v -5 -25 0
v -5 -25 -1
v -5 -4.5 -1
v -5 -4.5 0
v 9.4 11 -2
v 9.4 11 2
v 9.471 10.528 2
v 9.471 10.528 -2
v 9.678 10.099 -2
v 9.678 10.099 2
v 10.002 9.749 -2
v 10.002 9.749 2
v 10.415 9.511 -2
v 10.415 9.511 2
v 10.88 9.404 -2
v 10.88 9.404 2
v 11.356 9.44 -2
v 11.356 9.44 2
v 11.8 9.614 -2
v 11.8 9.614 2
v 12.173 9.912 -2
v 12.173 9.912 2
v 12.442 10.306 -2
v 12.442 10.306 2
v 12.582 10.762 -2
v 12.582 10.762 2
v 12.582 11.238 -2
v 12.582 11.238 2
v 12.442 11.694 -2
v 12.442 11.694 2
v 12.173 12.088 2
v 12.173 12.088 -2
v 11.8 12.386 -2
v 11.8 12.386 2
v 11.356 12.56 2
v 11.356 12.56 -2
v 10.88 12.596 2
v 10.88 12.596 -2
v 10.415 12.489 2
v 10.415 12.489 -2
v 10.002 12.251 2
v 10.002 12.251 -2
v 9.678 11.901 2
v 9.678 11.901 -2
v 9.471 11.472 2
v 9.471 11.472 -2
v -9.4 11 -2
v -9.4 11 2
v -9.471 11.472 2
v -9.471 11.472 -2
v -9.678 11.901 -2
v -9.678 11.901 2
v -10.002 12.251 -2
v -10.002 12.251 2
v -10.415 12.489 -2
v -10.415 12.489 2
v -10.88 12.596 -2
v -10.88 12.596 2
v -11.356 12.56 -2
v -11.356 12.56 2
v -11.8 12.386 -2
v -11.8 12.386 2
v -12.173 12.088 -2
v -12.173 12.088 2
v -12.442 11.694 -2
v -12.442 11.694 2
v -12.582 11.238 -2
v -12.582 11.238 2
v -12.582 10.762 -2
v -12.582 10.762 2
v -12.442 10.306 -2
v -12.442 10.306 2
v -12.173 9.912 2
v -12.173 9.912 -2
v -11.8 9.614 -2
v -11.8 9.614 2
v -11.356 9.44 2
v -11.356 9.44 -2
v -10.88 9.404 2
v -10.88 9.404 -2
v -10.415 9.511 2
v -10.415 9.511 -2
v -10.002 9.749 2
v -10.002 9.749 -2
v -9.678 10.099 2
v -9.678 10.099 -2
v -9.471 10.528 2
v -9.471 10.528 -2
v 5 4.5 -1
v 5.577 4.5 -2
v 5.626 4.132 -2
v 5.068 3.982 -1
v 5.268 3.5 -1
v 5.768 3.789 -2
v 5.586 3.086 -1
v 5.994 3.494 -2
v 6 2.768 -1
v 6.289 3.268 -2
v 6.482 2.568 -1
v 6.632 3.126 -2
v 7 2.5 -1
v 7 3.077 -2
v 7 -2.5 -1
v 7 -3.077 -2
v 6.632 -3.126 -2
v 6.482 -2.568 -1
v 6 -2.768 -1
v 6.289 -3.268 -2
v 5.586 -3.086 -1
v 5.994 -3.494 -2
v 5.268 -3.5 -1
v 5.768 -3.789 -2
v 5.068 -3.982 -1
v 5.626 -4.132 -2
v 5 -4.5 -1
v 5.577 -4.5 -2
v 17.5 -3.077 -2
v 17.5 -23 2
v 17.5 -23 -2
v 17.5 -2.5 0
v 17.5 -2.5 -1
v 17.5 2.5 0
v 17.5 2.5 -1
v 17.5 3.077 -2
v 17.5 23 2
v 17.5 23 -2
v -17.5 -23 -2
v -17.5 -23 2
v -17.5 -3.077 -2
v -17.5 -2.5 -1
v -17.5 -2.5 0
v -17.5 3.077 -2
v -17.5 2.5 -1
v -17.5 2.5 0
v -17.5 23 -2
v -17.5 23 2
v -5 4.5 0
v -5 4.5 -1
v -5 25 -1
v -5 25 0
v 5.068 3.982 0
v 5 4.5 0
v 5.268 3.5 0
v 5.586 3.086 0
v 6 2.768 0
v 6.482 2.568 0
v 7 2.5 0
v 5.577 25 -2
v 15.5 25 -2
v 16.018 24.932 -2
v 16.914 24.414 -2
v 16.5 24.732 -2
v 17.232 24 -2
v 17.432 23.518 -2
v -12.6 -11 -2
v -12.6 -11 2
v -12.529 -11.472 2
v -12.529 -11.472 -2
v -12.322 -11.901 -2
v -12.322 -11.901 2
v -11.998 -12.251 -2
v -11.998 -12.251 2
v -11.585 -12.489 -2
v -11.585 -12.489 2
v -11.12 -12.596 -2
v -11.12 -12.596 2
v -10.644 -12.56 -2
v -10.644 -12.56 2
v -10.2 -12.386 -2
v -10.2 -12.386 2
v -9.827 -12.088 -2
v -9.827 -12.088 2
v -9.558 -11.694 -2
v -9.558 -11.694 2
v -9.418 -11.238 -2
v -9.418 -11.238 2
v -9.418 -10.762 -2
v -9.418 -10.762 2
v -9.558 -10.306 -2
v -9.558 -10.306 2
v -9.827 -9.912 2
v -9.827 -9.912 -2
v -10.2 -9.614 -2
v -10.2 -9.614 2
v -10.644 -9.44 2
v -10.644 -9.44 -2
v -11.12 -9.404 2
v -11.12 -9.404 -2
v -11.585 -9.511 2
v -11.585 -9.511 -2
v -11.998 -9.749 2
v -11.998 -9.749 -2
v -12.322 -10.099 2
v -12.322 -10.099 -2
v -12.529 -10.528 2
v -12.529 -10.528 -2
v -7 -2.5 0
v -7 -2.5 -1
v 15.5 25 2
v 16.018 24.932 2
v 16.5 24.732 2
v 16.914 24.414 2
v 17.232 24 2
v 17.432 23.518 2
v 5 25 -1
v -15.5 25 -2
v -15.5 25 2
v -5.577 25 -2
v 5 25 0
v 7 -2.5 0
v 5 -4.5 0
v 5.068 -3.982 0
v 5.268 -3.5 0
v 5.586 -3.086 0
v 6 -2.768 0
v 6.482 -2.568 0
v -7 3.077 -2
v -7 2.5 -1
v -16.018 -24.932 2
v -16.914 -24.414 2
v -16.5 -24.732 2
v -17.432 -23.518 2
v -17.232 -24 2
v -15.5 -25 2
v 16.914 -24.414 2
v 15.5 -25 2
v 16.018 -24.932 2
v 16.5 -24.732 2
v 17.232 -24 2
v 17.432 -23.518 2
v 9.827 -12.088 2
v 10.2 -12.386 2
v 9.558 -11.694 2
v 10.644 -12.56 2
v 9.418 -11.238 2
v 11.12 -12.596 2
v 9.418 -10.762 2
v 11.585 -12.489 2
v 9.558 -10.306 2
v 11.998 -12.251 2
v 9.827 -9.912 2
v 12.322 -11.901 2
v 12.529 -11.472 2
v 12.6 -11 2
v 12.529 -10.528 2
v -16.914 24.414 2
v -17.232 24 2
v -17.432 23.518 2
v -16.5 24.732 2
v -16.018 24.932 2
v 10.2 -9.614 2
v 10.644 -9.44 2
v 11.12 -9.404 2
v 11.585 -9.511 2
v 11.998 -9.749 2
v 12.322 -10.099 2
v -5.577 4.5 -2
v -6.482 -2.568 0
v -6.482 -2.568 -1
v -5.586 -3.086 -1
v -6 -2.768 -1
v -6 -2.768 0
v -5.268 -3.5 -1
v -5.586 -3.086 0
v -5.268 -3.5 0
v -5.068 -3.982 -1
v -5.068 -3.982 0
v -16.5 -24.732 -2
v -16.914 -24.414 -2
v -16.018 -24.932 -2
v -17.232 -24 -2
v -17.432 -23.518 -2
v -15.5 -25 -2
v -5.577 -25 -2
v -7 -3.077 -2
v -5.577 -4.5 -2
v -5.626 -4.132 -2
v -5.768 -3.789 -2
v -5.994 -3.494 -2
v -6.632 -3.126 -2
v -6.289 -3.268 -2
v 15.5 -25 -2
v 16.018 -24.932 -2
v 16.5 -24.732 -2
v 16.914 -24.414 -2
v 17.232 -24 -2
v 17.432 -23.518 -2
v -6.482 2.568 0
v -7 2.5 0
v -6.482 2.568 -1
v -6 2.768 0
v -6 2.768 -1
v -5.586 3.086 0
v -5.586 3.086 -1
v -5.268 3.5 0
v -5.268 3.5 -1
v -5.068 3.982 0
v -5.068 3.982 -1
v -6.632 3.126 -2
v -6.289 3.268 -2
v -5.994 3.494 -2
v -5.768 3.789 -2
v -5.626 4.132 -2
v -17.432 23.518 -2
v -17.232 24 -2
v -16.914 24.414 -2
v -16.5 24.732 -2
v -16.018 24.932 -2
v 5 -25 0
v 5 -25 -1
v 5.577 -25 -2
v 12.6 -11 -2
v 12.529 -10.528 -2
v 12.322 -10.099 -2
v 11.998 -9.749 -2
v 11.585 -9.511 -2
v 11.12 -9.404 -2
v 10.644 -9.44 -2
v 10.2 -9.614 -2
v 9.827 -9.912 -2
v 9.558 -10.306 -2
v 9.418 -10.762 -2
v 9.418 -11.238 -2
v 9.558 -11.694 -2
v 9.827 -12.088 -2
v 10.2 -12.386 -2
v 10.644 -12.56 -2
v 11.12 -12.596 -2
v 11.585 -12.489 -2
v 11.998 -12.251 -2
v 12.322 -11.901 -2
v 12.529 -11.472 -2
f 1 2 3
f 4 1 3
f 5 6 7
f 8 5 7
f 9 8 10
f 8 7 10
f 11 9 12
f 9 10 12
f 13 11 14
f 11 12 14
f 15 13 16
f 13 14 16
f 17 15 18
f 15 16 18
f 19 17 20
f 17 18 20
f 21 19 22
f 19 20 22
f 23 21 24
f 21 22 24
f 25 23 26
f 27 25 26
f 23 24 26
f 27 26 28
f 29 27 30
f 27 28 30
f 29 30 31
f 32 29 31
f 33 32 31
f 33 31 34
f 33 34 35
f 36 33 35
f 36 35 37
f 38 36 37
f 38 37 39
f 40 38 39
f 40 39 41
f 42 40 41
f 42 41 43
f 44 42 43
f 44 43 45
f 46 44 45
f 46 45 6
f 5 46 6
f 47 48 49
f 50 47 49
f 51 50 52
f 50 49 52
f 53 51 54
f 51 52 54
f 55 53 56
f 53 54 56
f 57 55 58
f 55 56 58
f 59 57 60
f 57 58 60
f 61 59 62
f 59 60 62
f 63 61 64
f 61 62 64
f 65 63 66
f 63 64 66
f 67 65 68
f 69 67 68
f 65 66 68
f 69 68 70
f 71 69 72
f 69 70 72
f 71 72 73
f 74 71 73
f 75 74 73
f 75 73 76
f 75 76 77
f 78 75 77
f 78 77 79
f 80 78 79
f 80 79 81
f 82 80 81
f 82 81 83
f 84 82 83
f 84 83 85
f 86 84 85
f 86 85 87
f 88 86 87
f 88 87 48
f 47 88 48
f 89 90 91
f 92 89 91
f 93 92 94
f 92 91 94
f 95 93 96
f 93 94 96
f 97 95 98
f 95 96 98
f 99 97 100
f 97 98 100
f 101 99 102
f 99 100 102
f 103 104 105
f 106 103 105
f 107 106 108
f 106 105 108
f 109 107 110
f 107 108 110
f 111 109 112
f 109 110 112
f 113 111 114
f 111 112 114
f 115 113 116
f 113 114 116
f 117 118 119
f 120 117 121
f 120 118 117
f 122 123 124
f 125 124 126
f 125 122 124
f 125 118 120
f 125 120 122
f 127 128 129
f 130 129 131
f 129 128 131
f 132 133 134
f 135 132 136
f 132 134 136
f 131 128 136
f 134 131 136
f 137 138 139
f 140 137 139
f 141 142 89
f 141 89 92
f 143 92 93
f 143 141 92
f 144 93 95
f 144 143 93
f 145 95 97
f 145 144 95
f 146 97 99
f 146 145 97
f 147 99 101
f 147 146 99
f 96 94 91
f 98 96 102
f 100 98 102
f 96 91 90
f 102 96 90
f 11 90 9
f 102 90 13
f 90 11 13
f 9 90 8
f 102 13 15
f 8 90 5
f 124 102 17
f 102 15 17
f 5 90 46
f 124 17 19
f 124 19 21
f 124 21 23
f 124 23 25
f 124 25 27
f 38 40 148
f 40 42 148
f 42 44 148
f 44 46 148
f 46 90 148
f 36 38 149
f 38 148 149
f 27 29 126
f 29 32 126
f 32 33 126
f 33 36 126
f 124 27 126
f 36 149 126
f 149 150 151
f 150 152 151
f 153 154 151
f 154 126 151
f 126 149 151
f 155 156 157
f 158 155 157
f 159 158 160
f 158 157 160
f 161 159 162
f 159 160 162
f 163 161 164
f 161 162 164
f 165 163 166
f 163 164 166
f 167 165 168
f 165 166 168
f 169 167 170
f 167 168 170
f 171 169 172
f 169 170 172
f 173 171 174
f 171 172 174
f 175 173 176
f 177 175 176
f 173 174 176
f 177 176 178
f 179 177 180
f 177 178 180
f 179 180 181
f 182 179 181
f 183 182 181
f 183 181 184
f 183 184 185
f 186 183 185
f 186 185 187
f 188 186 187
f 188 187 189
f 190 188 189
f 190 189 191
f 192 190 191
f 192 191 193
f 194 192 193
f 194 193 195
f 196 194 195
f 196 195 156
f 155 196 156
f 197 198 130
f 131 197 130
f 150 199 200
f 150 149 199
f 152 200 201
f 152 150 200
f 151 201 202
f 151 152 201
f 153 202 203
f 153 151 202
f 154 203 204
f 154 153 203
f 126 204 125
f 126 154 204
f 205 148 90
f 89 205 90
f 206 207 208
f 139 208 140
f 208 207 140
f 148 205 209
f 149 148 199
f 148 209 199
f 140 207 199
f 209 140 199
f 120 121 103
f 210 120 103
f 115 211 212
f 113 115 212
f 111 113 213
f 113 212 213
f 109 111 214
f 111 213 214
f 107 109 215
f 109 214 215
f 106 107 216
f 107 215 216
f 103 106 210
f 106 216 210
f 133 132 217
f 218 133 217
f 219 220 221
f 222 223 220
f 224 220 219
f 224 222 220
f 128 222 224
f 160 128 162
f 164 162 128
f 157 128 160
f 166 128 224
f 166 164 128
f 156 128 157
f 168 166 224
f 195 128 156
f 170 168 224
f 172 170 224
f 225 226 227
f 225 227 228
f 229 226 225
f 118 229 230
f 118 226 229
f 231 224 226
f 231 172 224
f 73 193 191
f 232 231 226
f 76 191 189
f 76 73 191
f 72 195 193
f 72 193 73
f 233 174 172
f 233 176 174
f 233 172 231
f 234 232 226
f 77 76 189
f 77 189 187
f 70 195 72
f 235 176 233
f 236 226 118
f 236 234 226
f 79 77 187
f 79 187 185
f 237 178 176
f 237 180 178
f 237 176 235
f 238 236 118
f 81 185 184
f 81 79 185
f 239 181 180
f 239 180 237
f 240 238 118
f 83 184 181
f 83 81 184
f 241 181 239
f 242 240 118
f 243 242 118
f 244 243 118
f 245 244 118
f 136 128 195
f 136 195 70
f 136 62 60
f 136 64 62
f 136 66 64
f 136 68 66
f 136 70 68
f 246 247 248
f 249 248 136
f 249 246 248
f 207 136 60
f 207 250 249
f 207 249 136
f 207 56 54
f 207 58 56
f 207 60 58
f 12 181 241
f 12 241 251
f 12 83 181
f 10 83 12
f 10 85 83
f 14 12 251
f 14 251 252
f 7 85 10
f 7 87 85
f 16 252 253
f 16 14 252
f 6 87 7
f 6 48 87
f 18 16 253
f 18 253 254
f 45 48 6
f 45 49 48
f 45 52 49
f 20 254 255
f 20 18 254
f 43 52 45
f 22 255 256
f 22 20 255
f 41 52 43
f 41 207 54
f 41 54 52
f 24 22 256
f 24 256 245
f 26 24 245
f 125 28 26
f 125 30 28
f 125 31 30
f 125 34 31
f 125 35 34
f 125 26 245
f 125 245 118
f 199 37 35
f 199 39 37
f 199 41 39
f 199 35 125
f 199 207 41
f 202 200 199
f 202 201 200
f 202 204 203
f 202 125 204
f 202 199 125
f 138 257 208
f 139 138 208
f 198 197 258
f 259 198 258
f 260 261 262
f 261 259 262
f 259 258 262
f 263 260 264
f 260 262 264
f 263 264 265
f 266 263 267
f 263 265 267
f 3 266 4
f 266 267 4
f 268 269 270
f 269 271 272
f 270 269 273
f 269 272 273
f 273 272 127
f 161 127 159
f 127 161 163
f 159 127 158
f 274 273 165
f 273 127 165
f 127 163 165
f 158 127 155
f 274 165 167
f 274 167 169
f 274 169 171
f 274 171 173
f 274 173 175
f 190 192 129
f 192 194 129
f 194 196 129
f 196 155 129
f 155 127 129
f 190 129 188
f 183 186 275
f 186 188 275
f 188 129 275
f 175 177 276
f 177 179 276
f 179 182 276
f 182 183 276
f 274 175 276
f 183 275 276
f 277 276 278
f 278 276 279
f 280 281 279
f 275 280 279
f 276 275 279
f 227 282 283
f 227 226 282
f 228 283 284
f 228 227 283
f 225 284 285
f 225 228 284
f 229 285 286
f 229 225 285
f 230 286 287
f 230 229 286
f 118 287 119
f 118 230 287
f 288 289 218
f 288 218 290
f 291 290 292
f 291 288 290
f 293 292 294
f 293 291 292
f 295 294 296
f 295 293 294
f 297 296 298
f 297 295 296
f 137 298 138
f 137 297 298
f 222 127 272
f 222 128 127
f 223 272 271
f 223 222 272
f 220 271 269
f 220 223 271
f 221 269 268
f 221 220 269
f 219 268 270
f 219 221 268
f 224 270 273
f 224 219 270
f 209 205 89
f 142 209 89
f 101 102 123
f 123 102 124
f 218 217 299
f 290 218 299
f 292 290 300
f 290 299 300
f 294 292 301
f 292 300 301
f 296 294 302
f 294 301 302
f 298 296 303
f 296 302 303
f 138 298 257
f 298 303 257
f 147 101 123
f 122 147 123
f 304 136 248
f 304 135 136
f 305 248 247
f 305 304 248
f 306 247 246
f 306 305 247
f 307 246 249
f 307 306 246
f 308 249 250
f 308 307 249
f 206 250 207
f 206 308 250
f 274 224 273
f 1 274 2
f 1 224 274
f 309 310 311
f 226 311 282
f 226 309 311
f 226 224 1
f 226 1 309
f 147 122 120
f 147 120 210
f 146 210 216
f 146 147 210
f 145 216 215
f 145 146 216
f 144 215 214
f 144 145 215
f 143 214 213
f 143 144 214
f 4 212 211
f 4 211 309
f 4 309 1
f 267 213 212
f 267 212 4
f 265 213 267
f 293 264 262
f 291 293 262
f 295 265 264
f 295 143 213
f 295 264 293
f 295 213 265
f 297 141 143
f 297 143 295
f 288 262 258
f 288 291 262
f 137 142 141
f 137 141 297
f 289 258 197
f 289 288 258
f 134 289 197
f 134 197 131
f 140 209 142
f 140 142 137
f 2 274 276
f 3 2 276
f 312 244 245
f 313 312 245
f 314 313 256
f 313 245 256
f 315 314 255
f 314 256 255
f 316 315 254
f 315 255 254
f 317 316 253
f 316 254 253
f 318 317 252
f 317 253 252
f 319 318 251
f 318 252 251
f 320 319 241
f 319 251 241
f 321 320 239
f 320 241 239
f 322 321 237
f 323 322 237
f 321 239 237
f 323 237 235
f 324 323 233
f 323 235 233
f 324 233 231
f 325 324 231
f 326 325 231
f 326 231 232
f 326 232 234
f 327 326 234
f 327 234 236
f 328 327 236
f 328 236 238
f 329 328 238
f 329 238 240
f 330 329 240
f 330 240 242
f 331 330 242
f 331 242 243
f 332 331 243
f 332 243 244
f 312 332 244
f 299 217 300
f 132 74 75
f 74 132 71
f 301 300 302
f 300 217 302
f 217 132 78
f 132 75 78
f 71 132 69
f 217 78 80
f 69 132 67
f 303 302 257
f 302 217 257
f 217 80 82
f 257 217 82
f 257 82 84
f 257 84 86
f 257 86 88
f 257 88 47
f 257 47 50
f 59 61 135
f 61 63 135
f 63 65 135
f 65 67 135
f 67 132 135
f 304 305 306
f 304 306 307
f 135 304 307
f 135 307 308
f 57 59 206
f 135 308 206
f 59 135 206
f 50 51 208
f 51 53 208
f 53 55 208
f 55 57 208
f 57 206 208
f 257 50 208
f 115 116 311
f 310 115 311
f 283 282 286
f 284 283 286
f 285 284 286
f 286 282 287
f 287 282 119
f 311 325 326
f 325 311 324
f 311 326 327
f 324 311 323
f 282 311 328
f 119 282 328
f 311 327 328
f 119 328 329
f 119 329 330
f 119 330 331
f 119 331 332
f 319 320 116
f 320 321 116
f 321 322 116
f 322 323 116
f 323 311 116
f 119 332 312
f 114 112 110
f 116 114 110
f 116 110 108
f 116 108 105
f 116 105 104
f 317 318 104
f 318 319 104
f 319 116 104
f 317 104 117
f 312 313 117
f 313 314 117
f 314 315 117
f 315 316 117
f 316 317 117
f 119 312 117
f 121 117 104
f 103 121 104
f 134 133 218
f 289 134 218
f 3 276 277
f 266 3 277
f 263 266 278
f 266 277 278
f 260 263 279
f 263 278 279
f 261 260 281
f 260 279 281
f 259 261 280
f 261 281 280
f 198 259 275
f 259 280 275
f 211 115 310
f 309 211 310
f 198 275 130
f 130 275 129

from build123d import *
from OCP.BRepFilletAPI import BRepFilletAPI_MakeChamfer

# Parameters (mm, degrees)
SCHIZZO1_W                   = 35
SCHIZZO1_H                   = 50
ESTRUSIONE_ESTRUSIONE1_DEPTH = 2
TAGLIO_ESTRUSIONE1_DEPTH     = 2
RACCORDO1_R                  = 2
SMUSSO1_SIZE                 = 1
SMUSSO1_SIZE2                = 0.577350269
SKETCH1_R                    = 1.6
CUT_EXTRUDE1_DEPTH           = 31.777426793
CUT_EXTRUDE1_DEPTH_BACK      = 31.777426793


with BuildPart() as part:
    # Schizzo1 → Estrusione-Estrusione1 (new, symmetric)
    with BuildSketch(Plane.XY):
        Rectangle(SCHIZZO1_W, SCHIZZO1_H)
    extrude(amount=ESTRUSIONE_ESTRUSIONE1_DEPTH, both=True)

    # Schizzo2 → Taglio-Estrusione1 (cut)
    with BuildSketch(Plane(origin=(0, 0, -2), x_dir=(-1, 0, 0), z_dir=(0, 0, -1))):
        Polygon((-5, -25), (5, -25), (5, -2.5), (17.5, -2.5), (17.5, 2.5), (5, 2.5), (5, 25), (-5, 25), (-5, 2.5), (-17.5, 2.5), (-17.5, -2.5), (-5, -2.5), align=None)
    extrude(amount=-TAGLIO_ESTRUSIONE1_DEPTH, mode=Mode.SUBTRACT)

    # Raccordo1
    raccordo1_edges = [part.edges().sort_by_distance(p)[0] for p in [
        (-5, 2.5, -1),
        (-5, -2.5, -1),
        (5, -2.5, -1),
        (5, 2.5, -1),
        (-17.5, -25, 0),
        (17.5, -25, 0),
        (17.5, 25, 0),
        (-17.5, 25, 0),
    ]]
    fillet(raccordo1_edges, radius=RACCORDO1_R)

    # Smusso1: one chamfer whose edges measure the first distance from different faces: ONE call of the kernel's chamfer builder (chamfer() names one face for all edges)
    smusso1_edges_1 = [part.edges().sort_by_distance(p)[0] for p in [
        (5, 14.75, -2),
    ]]
    smusso1_side_1 = [part.faces().sort_by_distance(p)[0] for p in [
        (5, 14.75, -1),
    ]]
    smusso1_edges_2 = [part.edges().sort_by_distance(p)[0] for p in [
        (12.25, -2.5, -2),
    ]]
    smusso1_side_2 = [part.faces().sort_by_distance(p)[0] for p in [
        (12.25, -2.5, -1),
    ]]
    smusso1_edges_3 = [part.edges().sort_by_distance(p)[0] for p in [
        (-5, -14.75, -2),
    ]]
    smusso1_side_3 = [part.faces().sort_by_distance(p)[0] for p in [
        (-5, -14.75, -1),
    ]]
    smusso1_edges_4 = [part.edges().sort_by_distance(p)[0] for p in [
        (-12.25, 2.5, -2),
    ]]
    smusso1_side_4 = [part.faces().sort_by_distance(p)[0] for p in [
        (-12.25, 2.5, -1),
    ]]
    smusso1_edges_5 = [part.edges().sort_by_distance(p)[0] for p in [
        (5, -14.75, -2),
    ]]
    smusso1_side_5 = [part.faces().sort_by_distance(p)[0] for p in [
        (5, -14.75, -1),
    ]]
    smusso1_edges_6 = [part.edges().sort_by_distance(p)[0] for p in [
        (5.585786438, -3.085786438, -2),
    ]]
    smusso1_side_6 = [part.faces().sort_by_distance(p)[0] for p in [
        (5.585786438, -3.085786438, -1),
    ]]
    smusso1_edges_7 = [part.edges().sort_by_distance(p)[0] for p in [
        (-5, 14.75, -2),
    ]]
    smusso1_side_7 = [part.faces().sort_by_distance(p)[0] for p in [
        (-5, 14.75, -1),
    ]]
    smusso1_edges_8 = [part.edges().sort_by_distance(p)[0] for p in [
        (-5.585786438, 3.085786438, -2),
    ]]
    smusso1_side_8 = [part.faces().sort_by_distance(p)[0] for p in [
        (-5.585786438, 3.085786438, -1),
    ]]
    smusso1_edges_9 = [part.edges().sort_by_distance(p)[0] for p in [
        (-12.25, -2.5, -2),
    ]]
    smusso1_side_9 = [part.faces().sort_by_distance(p)[0] for p in [
        (-12.25, -2.5, -1),
    ]]
    smusso1_edges_10 = [part.edges().sort_by_distance(p)[0] for p in [
        (-5.585786438, -3.085786438, -2),
    ]]
    smusso1_side_10 = [part.faces().sort_by_distance(p)[0] for p in [
        (-5.585786438, -3.085786438, -1),
    ]]
    smusso1_edges_11 = [part.edges().sort_by_distance(p)[0] for p in [
        (12.25, 2.5, -2),
    ]]
    smusso1_side_11 = [part.faces().sort_by_distance(p)[0] for p in [
        (12.25, 2.5, -1),
    ]]
    smusso1_edges_12 = [part.edges().sort_by_distance(p)[0] for p in [
        (5.585786438, 3.085786438, -2),
    ]]
    smusso1_side_12 = [part.faces().sort_by_distance(p)[0] for p in [
        (5.585786438, 3.085786438, -1),
    ]]
    smusso1 = BRepFilletAPI_MakeChamfer(part.part.solid().wrapped)
    for e in smusso1_edges_1:
        smusso1.Add(SMUSSO1_SIZE, SMUSSO1_SIZE2, e.wrapped, smusso1_side_1[0].wrapped)  # the first distance lies on this face
    for e in smusso1_edges_2:
        smusso1.Add(SMUSSO1_SIZE, SMUSSO1_SIZE2, e.wrapped, smusso1_side_2[0].wrapped)  # the first distance lies on this face
    for e in smusso1_edges_3:
        smusso1.Add(SMUSSO1_SIZE, SMUSSO1_SIZE2, e.wrapped, smusso1_side_3[0].wrapped)  # the first distance lies on this face
    for e in smusso1_edges_4:
        smusso1.Add(SMUSSO1_SIZE, SMUSSO1_SIZE2, e.wrapped, smusso1_side_4[0].wrapped)  # the first distance lies on this face
    for e in smusso1_edges_5:
        smusso1.Add(SMUSSO1_SIZE, SMUSSO1_SIZE2, e.wrapped, smusso1_side_5[0].wrapped)  # the first distance lies on this face
    for e in smusso1_edges_6:
        smusso1.Add(SMUSSO1_SIZE, SMUSSO1_SIZE2, e.wrapped, smusso1_side_6[0].wrapped)  # the first distance lies on this face
    for e in smusso1_edges_7:
        smusso1.Add(SMUSSO1_SIZE, SMUSSO1_SIZE2, e.wrapped, smusso1_side_7[0].wrapped)  # the first distance lies on this face
    for e in smusso1_edges_8:
        smusso1.Add(SMUSSO1_SIZE, SMUSSO1_SIZE2, e.wrapped, smusso1_side_8[0].wrapped)  # the first distance lies on this face
    for e in smusso1_edges_9:
        smusso1.Add(SMUSSO1_SIZE, SMUSSO1_SIZE2, e.wrapped, smusso1_side_9[0].wrapped)  # the first distance lies on this face
    for e in smusso1_edges_10:
        smusso1.Add(SMUSSO1_SIZE, SMUSSO1_SIZE2, e.wrapped, smusso1_side_10[0].wrapped)  # the first distance lies on this face
    for e in smusso1_edges_11:
        smusso1.Add(SMUSSO1_SIZE, SMUSSO1_SIZE2, e.wrapped, smusso1_side_11[0].wrapped)  # the first distance lies on this face
    for e in smusso1_edges_12:
        smusso1.Add(SMUSSO1_SIZE, SMUSSO1_SIZE2, e.wrapped, smusso1_side_12[0].wrapped)  # the first distance lies on this face
    add(Compound.cast(smusso1.Shape()), mode=Mode.REPLACE)

    # Sketch1 → Cut-Extrude1 (cut, two sides)
    with BuildSketch(Plane.XY.offset(2)) as cut_extrude1_sk:
        with Locations((-11, 11)):
            Circle(SKETCH1_R)
        with Locations(Location((11, 11, 0), (0, 0, 180))):
            Circle(SKETCH1_R)
        with Locations((11, -11)):
            Circle(SKETCH1_R)
        with Locations(Location((-11, -11, 0), (0, 0, 180))):
            Circle(SKETCH1_R)
    extrude(amount=CUT_EXTRUDE1_DEPTH, mode=Mode.SUBTRACT)
    extrude(cut_extrude1_sk.sketch, amount=-CUT_EXTRUDE1_DEPTH_BACK, mode=Mode.SUBTRACT)


solid = part.part
